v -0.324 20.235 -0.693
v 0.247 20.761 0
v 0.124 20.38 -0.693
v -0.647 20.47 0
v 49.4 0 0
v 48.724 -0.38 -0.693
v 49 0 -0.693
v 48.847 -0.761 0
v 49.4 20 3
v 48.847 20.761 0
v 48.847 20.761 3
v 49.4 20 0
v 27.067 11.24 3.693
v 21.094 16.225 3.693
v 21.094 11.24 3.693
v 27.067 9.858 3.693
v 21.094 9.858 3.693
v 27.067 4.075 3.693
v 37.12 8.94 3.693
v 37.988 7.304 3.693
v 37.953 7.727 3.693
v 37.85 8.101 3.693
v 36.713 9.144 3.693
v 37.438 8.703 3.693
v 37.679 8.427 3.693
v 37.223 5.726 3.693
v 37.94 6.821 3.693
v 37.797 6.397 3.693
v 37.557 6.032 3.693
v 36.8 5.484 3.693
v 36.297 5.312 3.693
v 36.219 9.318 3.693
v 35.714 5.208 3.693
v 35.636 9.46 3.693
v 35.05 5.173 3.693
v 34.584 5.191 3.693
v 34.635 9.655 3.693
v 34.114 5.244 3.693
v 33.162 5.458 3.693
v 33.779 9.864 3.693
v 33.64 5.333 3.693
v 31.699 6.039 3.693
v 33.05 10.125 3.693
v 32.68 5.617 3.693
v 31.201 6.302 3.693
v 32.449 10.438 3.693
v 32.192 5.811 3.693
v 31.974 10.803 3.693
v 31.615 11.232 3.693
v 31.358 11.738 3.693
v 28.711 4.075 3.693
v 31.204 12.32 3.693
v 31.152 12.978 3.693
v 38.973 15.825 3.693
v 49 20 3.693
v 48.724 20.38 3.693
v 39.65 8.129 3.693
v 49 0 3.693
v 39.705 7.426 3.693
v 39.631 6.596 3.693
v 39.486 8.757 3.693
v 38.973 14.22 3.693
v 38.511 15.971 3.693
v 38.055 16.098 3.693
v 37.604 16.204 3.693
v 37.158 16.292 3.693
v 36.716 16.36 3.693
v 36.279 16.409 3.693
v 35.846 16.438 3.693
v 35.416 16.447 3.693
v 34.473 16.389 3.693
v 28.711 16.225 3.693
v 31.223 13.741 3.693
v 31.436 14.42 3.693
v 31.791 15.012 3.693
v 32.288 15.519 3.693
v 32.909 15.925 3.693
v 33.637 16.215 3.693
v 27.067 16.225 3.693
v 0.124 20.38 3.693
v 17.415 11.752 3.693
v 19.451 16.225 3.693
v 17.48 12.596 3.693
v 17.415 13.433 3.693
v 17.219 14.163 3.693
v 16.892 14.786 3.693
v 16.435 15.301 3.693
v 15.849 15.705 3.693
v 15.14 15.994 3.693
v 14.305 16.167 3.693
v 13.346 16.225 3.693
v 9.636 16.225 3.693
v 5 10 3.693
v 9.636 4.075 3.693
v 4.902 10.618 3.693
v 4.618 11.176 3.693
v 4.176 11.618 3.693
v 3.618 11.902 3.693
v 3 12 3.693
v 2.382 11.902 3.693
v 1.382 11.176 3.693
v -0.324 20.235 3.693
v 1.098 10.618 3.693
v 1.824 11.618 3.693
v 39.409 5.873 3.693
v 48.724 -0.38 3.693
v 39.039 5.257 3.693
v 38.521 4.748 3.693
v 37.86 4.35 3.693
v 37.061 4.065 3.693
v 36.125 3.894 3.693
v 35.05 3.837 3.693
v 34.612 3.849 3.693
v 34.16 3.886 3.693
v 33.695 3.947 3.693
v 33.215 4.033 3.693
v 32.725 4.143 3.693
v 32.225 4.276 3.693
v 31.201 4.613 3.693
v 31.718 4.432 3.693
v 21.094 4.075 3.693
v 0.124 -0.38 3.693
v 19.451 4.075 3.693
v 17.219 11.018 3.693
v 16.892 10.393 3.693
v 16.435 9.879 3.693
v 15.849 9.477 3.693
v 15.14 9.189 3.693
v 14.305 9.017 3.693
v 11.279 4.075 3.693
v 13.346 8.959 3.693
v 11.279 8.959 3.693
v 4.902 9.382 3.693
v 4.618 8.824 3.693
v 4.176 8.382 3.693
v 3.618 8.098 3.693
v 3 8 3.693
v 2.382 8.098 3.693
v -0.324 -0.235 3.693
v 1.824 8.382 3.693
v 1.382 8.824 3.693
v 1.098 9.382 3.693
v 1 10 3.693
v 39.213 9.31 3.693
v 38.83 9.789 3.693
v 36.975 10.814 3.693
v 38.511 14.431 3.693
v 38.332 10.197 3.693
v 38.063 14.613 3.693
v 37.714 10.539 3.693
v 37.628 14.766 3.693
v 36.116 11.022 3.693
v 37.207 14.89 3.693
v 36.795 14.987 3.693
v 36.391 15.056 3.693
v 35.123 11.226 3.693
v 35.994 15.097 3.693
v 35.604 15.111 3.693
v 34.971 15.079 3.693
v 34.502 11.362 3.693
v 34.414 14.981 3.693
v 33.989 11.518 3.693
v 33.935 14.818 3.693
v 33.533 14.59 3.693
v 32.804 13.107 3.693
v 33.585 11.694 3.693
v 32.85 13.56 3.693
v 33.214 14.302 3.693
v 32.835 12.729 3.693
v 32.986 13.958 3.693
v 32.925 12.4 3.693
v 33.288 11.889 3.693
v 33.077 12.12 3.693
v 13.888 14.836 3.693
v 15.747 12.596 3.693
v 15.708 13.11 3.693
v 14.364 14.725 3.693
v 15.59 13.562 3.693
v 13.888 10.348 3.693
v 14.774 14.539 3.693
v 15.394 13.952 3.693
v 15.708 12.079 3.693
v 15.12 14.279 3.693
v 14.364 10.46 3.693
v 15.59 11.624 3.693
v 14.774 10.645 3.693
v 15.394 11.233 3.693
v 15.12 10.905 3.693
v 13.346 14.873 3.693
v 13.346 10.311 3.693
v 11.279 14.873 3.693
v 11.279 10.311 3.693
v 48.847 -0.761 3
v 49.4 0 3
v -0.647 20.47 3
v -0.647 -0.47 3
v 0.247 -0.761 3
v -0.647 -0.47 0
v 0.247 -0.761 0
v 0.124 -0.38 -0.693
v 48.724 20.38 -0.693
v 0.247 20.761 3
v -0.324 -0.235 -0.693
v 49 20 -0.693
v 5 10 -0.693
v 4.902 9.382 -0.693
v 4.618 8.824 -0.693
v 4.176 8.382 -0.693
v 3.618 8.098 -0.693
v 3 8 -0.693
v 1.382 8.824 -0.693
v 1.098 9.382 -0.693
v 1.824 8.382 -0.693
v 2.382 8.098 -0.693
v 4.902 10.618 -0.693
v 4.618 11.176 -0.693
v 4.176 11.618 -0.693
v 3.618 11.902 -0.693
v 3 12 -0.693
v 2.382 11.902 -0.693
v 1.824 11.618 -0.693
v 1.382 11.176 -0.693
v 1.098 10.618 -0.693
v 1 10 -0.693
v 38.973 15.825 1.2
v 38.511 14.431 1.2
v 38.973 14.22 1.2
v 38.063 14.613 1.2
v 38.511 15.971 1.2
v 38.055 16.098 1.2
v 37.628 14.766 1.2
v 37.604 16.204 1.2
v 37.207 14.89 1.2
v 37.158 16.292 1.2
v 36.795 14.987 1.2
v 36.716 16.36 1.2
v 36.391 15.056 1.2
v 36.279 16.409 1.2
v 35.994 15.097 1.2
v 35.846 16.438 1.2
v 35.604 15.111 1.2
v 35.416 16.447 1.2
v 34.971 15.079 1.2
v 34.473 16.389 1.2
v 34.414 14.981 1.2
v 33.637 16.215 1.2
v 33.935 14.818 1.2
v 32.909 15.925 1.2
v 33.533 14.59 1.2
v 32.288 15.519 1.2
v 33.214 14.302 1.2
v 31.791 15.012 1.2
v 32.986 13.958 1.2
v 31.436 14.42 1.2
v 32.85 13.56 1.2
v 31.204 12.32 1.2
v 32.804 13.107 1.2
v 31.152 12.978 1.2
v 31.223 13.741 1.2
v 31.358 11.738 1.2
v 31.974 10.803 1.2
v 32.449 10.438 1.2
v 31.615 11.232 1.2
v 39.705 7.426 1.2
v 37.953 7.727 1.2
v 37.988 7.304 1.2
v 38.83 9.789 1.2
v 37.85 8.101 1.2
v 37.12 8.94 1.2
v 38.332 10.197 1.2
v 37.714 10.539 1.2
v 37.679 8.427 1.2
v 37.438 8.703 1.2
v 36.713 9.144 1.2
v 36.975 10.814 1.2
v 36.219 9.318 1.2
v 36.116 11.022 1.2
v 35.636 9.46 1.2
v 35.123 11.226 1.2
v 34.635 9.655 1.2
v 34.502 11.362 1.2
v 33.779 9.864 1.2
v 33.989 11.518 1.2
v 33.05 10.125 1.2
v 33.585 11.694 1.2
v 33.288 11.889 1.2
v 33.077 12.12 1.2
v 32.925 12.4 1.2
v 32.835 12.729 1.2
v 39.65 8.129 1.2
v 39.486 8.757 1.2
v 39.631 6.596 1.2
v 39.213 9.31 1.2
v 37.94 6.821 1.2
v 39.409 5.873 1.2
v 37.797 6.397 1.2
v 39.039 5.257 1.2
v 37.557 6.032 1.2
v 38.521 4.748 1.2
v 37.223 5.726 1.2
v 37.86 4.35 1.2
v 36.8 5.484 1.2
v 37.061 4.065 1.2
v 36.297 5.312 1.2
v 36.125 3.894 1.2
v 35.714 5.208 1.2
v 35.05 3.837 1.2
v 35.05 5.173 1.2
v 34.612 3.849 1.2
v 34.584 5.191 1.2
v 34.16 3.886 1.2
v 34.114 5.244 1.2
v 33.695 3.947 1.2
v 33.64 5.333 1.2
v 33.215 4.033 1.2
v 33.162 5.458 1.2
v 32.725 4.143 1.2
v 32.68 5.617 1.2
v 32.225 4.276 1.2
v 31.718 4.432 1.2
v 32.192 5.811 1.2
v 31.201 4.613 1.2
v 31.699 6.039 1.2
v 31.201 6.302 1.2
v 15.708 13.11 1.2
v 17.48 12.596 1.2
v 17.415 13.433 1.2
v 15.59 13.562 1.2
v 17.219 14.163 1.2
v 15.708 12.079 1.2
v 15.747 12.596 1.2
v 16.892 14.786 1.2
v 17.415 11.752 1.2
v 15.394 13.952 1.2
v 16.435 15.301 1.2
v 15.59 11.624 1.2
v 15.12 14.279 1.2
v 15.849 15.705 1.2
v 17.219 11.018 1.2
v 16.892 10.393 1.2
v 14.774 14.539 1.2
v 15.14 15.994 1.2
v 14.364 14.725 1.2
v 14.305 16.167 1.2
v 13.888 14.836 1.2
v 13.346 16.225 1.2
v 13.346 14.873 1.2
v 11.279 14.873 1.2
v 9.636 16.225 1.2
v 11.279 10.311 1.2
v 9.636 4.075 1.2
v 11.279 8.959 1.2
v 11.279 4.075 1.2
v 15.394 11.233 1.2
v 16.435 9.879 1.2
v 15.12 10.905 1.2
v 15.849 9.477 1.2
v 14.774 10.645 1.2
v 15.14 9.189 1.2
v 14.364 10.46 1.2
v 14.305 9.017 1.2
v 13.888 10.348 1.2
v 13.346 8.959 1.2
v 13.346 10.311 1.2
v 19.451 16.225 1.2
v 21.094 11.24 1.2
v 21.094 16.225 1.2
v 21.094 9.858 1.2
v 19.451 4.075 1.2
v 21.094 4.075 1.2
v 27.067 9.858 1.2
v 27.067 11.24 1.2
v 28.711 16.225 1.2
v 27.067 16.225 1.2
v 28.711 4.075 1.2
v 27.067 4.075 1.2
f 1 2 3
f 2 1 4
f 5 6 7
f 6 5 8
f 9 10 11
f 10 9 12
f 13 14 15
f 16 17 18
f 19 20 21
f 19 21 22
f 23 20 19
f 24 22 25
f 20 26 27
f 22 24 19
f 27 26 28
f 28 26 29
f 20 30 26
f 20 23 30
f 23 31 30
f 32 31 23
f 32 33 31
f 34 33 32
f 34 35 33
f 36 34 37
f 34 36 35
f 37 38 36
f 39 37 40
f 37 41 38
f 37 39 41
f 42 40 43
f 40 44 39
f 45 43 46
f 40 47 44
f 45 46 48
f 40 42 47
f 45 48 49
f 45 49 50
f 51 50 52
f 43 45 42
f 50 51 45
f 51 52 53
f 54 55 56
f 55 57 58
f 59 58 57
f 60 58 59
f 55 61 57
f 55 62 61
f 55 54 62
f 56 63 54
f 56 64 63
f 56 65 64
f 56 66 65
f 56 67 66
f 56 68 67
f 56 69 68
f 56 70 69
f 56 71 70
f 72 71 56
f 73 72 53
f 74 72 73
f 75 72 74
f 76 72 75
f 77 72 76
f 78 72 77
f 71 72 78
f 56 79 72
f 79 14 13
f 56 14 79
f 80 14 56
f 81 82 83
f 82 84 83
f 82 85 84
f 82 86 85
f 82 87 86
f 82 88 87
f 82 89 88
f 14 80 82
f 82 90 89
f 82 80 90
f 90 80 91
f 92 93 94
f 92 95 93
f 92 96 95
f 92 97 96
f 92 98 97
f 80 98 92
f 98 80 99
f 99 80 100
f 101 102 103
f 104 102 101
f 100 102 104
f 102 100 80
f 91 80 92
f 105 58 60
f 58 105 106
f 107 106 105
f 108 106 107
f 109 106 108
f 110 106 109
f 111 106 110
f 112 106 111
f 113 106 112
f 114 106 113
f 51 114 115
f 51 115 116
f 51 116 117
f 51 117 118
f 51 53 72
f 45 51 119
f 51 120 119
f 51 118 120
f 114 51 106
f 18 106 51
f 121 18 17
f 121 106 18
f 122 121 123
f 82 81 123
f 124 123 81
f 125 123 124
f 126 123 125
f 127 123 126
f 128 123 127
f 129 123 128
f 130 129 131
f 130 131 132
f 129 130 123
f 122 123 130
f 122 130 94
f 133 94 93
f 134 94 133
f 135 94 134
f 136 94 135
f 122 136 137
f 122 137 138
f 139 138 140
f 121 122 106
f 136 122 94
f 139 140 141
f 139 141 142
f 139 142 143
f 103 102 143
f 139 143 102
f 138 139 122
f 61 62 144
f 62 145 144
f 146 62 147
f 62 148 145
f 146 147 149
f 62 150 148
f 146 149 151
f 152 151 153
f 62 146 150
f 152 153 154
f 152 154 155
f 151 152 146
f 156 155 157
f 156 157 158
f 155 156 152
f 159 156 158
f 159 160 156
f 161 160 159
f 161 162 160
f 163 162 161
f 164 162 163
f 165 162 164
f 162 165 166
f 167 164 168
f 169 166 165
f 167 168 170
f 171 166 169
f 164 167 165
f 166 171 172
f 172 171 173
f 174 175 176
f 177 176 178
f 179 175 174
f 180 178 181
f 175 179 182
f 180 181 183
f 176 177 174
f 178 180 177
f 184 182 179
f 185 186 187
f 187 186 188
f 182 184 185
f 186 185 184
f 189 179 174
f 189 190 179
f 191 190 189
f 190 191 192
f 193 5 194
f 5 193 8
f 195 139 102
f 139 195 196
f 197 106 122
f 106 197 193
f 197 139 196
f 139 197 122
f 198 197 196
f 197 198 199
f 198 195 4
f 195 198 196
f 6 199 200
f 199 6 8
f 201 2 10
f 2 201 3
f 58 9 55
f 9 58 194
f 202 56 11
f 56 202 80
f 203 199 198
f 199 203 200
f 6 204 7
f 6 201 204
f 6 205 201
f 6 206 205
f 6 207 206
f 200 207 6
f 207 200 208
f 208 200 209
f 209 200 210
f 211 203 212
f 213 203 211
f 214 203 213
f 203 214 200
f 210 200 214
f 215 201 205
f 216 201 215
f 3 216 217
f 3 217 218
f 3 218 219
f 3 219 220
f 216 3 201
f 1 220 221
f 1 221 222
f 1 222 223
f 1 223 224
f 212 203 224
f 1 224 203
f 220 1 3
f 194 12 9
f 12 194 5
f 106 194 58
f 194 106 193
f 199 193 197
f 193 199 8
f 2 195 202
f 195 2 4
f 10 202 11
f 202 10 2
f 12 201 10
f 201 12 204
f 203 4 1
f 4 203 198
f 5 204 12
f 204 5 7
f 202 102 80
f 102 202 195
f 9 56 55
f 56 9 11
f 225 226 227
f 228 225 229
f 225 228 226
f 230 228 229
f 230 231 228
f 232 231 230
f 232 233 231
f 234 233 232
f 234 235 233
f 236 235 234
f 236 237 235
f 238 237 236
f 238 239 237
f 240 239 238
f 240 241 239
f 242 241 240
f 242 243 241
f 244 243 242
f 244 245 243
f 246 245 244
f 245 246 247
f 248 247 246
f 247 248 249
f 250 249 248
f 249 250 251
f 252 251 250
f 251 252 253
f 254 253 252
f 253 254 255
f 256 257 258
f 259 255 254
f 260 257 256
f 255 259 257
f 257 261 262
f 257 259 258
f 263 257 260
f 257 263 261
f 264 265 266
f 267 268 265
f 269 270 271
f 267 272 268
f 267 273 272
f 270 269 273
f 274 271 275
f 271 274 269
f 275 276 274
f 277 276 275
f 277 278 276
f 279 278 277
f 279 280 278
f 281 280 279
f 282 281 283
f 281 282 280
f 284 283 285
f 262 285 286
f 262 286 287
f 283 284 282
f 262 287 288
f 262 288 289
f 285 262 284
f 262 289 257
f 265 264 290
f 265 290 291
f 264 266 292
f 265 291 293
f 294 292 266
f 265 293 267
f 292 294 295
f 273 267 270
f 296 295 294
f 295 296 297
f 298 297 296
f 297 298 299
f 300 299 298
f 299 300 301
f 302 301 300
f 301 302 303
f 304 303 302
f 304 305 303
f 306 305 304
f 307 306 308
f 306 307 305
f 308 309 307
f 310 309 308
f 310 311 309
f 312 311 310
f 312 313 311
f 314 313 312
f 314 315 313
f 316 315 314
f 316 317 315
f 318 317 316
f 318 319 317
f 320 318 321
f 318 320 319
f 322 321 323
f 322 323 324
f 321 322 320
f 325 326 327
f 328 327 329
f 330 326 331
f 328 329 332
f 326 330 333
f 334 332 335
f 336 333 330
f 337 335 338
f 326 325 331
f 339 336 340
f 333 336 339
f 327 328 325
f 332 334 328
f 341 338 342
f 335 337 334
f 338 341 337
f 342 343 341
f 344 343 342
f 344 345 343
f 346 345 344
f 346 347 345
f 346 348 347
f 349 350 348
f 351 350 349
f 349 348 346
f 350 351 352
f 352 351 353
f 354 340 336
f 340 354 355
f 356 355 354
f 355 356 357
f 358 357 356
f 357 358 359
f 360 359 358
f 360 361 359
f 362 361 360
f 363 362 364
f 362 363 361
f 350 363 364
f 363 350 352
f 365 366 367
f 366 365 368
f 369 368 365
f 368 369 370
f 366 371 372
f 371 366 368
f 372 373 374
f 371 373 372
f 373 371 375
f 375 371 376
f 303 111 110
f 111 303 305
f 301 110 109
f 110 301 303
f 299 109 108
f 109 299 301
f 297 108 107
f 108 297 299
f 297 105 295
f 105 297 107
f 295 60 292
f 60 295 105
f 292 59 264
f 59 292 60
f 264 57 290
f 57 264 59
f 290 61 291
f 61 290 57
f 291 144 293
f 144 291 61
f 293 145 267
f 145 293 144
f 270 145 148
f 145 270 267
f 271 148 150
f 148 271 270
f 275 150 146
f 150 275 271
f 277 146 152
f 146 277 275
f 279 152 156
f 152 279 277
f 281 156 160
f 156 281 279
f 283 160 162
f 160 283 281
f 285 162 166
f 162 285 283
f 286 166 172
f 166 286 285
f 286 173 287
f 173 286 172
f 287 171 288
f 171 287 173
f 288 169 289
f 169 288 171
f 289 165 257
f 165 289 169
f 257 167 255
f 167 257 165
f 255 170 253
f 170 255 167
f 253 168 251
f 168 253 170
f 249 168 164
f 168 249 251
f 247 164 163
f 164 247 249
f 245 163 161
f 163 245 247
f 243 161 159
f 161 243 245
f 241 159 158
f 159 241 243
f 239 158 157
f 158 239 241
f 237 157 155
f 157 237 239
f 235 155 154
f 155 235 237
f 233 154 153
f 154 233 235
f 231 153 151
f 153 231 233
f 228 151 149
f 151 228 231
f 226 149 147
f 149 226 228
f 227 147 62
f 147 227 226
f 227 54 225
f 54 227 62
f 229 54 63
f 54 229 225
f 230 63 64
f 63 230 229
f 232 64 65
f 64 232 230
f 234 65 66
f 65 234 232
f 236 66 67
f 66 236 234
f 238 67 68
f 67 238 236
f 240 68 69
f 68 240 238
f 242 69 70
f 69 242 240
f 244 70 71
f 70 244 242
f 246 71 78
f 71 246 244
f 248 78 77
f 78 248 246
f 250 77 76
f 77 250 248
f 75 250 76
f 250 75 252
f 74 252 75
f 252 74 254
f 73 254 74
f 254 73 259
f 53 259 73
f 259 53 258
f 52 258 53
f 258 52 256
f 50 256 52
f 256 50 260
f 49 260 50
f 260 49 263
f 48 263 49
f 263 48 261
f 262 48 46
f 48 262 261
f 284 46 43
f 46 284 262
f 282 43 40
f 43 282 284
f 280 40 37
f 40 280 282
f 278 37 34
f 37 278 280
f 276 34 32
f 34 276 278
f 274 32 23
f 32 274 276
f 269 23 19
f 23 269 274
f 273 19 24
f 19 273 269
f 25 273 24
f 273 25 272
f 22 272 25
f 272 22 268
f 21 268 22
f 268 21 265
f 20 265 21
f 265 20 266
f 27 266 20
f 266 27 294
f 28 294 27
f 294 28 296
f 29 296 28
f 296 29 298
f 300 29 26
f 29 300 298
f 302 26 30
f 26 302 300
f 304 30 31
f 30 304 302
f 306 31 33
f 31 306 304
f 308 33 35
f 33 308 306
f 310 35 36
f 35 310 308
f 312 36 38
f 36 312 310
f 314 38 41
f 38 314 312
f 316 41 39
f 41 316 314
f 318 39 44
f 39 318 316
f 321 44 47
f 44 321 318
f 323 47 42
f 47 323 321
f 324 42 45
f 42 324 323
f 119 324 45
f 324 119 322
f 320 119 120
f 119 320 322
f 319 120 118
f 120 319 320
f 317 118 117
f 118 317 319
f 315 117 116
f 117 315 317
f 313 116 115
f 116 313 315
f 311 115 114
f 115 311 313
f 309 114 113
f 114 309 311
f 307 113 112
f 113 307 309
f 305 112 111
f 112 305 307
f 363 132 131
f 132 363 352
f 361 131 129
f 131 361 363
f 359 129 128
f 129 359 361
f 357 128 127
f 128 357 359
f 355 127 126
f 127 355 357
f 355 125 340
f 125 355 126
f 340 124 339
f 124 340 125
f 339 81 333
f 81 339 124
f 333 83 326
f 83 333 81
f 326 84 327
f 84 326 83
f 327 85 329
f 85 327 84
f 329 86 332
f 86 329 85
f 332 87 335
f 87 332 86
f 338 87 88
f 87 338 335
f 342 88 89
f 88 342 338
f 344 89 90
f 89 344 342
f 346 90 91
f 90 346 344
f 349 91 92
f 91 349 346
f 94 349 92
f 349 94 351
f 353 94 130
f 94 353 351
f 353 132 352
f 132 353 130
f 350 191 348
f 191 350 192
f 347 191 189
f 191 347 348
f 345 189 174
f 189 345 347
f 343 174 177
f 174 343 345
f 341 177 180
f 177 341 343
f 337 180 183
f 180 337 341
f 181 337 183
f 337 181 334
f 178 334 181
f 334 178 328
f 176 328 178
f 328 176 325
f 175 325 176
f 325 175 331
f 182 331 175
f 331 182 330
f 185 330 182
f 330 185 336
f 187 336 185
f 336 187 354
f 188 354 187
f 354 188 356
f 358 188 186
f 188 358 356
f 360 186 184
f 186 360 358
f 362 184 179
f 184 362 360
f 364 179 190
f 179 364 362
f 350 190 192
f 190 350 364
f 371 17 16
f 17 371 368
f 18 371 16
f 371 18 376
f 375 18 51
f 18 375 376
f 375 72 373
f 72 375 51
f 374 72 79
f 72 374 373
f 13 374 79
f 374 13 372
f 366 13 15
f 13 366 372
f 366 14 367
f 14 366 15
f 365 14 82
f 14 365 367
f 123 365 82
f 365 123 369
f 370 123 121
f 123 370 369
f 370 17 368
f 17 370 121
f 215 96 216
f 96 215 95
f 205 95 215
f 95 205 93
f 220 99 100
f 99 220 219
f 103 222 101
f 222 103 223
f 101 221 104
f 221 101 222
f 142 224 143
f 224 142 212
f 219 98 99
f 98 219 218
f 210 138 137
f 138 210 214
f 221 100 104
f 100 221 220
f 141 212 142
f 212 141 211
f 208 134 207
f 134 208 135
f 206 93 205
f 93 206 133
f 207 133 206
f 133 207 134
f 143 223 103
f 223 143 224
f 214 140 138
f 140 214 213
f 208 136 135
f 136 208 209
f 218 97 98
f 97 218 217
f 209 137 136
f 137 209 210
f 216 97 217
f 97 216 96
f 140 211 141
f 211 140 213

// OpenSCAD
/*
The MIT License (MIT)

Copyright (c) 2016 Lynn A. Roth

Permission is hereby granted, free of charge, to any person obtaining a copy of
this software and associated documentation files (the "Software"), to deal in
the Software without restriction, including without limitation the rights to
use, copy, modify, merge, publish, distribute, sublicense, and/or sell copies of
the Software, and to permit persons to whom the Software is furnished to do so,
subject to the following conditions:

The above copyright notice and this permission notice shall be included in all
copies or substantial portions of the Software.

THE SOFTWARE IS PROVIDED "AS IS", WITHOUT WARRANTY OF ANY KIND, EXPRESS OR
IMPLIED, INCLUDING BUT NOT LIMITED TO THE WARRANTIES OF MERCHANTABILITY, FITNESS
FOR A PARTICULAR PURPOSE AND NONINFRINGEMENT. IN NO EVENT SHALL THE AUTHORS OR
COPYRIGHT HOLDERS BE LIABLE FOR ANY CLAIM, DAMAGES OR OTHER LIABILITY, WHETHER
IN AN ACTION OF CONTRACT, TORT OR OTHERWISE, ARISING FROM, OUT OF OR IN
CONNECTION WITH THE SOFTWARE OR THE USE OR OTHER DEALINGS IN THE SOFTWARE.
*/

//Set the words array to the words you want engraved.  One per side.
word="PHS";

//Set wordCount to the number of times the word should be printed.
letterCount=len(word);

//Depth of the word
namedepth = 2;

lw = 12.2;
margin = 6;
width= letterCount * lw + margin + margin;

//Height of main body of keyring
height=20;

//Thickness of keychain
depth = 3;

difference()
{
   body();
      
    translate([margin+2,height/2,depth - namedepth + .2])
        linear_extrude(height=namedepth+.6)
            text(text=word, size=12, font="Arial Black", halign="left", valign="center");
    
    translate([3,height/2,-.8])
        cylinder(r=2, h=depth + 2, $fn=20);
    
}

module body()
{
     minkowski()
		{
			cube([width, height, depth]);
			sphere(.8);
		};
}
                        
